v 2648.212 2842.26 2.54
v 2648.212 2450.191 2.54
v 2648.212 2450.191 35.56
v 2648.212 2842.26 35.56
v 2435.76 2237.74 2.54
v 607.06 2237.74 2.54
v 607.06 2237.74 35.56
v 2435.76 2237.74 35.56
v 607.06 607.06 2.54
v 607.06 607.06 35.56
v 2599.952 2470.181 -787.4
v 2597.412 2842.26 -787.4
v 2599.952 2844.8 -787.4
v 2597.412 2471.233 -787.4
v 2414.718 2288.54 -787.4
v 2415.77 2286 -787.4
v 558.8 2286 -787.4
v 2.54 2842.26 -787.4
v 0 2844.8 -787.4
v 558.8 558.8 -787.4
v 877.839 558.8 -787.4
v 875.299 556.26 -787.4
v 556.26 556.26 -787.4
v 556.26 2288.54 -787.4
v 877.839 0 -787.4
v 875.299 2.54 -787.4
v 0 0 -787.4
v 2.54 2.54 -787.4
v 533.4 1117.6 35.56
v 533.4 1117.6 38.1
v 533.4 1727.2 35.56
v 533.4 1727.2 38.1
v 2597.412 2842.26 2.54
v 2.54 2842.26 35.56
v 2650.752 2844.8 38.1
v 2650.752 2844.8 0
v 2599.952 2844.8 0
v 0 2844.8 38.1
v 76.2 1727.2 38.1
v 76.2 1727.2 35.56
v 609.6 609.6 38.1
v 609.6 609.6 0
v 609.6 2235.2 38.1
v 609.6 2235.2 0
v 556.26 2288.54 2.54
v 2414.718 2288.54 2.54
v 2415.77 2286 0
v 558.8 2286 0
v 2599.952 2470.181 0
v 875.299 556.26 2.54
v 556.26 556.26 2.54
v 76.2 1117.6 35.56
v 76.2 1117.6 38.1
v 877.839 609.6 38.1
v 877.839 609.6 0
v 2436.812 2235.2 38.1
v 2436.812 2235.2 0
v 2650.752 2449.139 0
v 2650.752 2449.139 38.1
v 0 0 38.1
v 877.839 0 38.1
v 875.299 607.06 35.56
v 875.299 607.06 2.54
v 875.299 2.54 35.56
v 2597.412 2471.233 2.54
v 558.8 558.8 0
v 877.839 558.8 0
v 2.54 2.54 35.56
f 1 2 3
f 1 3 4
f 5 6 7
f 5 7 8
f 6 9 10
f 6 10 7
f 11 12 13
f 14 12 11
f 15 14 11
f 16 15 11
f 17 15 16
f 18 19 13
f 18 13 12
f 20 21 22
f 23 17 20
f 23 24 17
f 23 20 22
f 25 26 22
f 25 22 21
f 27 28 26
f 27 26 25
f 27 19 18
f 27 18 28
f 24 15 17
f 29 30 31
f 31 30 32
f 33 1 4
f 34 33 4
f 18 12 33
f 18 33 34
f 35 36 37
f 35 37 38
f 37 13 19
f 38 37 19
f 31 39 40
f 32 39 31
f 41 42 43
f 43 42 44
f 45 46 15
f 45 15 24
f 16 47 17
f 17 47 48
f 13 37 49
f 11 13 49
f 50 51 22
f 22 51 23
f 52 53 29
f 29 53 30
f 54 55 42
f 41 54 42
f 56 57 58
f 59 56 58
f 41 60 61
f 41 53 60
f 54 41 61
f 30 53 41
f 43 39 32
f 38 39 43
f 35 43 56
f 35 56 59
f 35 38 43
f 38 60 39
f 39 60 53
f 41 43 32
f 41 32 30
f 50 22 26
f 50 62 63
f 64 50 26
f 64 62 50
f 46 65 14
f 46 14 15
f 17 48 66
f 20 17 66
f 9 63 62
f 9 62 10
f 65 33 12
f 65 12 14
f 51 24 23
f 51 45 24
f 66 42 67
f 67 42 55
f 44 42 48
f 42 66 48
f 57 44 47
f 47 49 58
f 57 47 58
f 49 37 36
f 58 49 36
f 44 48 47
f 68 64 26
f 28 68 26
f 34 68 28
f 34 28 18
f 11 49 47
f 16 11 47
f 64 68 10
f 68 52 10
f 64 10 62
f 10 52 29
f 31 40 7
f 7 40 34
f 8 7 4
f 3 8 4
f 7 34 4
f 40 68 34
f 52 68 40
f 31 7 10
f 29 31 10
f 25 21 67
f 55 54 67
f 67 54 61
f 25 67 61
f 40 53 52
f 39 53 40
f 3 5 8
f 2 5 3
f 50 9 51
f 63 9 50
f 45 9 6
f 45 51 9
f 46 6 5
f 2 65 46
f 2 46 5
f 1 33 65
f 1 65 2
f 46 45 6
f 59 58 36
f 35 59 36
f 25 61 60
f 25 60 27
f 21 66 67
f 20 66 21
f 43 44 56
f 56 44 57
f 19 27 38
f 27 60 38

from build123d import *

# Parameters (mm, degrees)
F1_DEPTH = 38.1
F3_DEPTH = 787.4
F4_DEPTH = 50.8
F5_T     = -2.54
F6_W     = 457.2
F6_H     = 609.6
F7_DEPTH = 304.8


with BuildPart() as f1:
    # F0 (on Top) → F1 (new body)
    with BuildSketch(Plane.XY):
        Polygon((0, 2844.8), (0, 0), (877.83924, 0), (877.83924, 609.6), (609.6, 609.6), (609.6, 2235.2), (2436.8125, 2235.2), (2650.75162, 2449.13912), (2650.75162, 2844.8), align=None)
    extrude(amount=F1_DEPTH)

    # F2 (on face) → F3 (join)
    with BuildSketch(Plane(origin=(0, 0, 0), x_dir=(1, 0, 0), z_dir=(0, 0, -1))):
        Polygon((558.8, -2286), (558.8, -558.8), (827.03924, -558.8), (827.03924, 0), (0, 0), (0, -2844.8), (2599.95162, -2844.8), (2599.95162, -2470.1811689686), (2415.7704510314, -2286), align=None)
    extrude(amount=F3_DEPTH)

    # F4 (add): a face of the model
    f4_faces = [f1.faces().sort_by_distance(p)[0] for p in [
        (827.03924, 279.4, -393.7),
    ]]
    extrude(f4_faces, amount=F4_DEPTH)

    # F5
    f5_openings = [f1.faces().sort_by_distance(p)[0] for p in [
        (520.260883, 1422.4, -787.4),
    ]]
    offset(amount=F5_T, openings=f5_openings, kind=Kind.INTERSECTION)

    # F6 (on face) → F7 (cut)
    with BuildSketch(Plane.XY.offset(38.1)):
        with Locations((304.8, 1422.4)):
            Rectangle(F6_W, F6_H)
    extrude(amount=-F7_DEPTH, mode=Mode.SUBTRACT)


solid = f1.part
